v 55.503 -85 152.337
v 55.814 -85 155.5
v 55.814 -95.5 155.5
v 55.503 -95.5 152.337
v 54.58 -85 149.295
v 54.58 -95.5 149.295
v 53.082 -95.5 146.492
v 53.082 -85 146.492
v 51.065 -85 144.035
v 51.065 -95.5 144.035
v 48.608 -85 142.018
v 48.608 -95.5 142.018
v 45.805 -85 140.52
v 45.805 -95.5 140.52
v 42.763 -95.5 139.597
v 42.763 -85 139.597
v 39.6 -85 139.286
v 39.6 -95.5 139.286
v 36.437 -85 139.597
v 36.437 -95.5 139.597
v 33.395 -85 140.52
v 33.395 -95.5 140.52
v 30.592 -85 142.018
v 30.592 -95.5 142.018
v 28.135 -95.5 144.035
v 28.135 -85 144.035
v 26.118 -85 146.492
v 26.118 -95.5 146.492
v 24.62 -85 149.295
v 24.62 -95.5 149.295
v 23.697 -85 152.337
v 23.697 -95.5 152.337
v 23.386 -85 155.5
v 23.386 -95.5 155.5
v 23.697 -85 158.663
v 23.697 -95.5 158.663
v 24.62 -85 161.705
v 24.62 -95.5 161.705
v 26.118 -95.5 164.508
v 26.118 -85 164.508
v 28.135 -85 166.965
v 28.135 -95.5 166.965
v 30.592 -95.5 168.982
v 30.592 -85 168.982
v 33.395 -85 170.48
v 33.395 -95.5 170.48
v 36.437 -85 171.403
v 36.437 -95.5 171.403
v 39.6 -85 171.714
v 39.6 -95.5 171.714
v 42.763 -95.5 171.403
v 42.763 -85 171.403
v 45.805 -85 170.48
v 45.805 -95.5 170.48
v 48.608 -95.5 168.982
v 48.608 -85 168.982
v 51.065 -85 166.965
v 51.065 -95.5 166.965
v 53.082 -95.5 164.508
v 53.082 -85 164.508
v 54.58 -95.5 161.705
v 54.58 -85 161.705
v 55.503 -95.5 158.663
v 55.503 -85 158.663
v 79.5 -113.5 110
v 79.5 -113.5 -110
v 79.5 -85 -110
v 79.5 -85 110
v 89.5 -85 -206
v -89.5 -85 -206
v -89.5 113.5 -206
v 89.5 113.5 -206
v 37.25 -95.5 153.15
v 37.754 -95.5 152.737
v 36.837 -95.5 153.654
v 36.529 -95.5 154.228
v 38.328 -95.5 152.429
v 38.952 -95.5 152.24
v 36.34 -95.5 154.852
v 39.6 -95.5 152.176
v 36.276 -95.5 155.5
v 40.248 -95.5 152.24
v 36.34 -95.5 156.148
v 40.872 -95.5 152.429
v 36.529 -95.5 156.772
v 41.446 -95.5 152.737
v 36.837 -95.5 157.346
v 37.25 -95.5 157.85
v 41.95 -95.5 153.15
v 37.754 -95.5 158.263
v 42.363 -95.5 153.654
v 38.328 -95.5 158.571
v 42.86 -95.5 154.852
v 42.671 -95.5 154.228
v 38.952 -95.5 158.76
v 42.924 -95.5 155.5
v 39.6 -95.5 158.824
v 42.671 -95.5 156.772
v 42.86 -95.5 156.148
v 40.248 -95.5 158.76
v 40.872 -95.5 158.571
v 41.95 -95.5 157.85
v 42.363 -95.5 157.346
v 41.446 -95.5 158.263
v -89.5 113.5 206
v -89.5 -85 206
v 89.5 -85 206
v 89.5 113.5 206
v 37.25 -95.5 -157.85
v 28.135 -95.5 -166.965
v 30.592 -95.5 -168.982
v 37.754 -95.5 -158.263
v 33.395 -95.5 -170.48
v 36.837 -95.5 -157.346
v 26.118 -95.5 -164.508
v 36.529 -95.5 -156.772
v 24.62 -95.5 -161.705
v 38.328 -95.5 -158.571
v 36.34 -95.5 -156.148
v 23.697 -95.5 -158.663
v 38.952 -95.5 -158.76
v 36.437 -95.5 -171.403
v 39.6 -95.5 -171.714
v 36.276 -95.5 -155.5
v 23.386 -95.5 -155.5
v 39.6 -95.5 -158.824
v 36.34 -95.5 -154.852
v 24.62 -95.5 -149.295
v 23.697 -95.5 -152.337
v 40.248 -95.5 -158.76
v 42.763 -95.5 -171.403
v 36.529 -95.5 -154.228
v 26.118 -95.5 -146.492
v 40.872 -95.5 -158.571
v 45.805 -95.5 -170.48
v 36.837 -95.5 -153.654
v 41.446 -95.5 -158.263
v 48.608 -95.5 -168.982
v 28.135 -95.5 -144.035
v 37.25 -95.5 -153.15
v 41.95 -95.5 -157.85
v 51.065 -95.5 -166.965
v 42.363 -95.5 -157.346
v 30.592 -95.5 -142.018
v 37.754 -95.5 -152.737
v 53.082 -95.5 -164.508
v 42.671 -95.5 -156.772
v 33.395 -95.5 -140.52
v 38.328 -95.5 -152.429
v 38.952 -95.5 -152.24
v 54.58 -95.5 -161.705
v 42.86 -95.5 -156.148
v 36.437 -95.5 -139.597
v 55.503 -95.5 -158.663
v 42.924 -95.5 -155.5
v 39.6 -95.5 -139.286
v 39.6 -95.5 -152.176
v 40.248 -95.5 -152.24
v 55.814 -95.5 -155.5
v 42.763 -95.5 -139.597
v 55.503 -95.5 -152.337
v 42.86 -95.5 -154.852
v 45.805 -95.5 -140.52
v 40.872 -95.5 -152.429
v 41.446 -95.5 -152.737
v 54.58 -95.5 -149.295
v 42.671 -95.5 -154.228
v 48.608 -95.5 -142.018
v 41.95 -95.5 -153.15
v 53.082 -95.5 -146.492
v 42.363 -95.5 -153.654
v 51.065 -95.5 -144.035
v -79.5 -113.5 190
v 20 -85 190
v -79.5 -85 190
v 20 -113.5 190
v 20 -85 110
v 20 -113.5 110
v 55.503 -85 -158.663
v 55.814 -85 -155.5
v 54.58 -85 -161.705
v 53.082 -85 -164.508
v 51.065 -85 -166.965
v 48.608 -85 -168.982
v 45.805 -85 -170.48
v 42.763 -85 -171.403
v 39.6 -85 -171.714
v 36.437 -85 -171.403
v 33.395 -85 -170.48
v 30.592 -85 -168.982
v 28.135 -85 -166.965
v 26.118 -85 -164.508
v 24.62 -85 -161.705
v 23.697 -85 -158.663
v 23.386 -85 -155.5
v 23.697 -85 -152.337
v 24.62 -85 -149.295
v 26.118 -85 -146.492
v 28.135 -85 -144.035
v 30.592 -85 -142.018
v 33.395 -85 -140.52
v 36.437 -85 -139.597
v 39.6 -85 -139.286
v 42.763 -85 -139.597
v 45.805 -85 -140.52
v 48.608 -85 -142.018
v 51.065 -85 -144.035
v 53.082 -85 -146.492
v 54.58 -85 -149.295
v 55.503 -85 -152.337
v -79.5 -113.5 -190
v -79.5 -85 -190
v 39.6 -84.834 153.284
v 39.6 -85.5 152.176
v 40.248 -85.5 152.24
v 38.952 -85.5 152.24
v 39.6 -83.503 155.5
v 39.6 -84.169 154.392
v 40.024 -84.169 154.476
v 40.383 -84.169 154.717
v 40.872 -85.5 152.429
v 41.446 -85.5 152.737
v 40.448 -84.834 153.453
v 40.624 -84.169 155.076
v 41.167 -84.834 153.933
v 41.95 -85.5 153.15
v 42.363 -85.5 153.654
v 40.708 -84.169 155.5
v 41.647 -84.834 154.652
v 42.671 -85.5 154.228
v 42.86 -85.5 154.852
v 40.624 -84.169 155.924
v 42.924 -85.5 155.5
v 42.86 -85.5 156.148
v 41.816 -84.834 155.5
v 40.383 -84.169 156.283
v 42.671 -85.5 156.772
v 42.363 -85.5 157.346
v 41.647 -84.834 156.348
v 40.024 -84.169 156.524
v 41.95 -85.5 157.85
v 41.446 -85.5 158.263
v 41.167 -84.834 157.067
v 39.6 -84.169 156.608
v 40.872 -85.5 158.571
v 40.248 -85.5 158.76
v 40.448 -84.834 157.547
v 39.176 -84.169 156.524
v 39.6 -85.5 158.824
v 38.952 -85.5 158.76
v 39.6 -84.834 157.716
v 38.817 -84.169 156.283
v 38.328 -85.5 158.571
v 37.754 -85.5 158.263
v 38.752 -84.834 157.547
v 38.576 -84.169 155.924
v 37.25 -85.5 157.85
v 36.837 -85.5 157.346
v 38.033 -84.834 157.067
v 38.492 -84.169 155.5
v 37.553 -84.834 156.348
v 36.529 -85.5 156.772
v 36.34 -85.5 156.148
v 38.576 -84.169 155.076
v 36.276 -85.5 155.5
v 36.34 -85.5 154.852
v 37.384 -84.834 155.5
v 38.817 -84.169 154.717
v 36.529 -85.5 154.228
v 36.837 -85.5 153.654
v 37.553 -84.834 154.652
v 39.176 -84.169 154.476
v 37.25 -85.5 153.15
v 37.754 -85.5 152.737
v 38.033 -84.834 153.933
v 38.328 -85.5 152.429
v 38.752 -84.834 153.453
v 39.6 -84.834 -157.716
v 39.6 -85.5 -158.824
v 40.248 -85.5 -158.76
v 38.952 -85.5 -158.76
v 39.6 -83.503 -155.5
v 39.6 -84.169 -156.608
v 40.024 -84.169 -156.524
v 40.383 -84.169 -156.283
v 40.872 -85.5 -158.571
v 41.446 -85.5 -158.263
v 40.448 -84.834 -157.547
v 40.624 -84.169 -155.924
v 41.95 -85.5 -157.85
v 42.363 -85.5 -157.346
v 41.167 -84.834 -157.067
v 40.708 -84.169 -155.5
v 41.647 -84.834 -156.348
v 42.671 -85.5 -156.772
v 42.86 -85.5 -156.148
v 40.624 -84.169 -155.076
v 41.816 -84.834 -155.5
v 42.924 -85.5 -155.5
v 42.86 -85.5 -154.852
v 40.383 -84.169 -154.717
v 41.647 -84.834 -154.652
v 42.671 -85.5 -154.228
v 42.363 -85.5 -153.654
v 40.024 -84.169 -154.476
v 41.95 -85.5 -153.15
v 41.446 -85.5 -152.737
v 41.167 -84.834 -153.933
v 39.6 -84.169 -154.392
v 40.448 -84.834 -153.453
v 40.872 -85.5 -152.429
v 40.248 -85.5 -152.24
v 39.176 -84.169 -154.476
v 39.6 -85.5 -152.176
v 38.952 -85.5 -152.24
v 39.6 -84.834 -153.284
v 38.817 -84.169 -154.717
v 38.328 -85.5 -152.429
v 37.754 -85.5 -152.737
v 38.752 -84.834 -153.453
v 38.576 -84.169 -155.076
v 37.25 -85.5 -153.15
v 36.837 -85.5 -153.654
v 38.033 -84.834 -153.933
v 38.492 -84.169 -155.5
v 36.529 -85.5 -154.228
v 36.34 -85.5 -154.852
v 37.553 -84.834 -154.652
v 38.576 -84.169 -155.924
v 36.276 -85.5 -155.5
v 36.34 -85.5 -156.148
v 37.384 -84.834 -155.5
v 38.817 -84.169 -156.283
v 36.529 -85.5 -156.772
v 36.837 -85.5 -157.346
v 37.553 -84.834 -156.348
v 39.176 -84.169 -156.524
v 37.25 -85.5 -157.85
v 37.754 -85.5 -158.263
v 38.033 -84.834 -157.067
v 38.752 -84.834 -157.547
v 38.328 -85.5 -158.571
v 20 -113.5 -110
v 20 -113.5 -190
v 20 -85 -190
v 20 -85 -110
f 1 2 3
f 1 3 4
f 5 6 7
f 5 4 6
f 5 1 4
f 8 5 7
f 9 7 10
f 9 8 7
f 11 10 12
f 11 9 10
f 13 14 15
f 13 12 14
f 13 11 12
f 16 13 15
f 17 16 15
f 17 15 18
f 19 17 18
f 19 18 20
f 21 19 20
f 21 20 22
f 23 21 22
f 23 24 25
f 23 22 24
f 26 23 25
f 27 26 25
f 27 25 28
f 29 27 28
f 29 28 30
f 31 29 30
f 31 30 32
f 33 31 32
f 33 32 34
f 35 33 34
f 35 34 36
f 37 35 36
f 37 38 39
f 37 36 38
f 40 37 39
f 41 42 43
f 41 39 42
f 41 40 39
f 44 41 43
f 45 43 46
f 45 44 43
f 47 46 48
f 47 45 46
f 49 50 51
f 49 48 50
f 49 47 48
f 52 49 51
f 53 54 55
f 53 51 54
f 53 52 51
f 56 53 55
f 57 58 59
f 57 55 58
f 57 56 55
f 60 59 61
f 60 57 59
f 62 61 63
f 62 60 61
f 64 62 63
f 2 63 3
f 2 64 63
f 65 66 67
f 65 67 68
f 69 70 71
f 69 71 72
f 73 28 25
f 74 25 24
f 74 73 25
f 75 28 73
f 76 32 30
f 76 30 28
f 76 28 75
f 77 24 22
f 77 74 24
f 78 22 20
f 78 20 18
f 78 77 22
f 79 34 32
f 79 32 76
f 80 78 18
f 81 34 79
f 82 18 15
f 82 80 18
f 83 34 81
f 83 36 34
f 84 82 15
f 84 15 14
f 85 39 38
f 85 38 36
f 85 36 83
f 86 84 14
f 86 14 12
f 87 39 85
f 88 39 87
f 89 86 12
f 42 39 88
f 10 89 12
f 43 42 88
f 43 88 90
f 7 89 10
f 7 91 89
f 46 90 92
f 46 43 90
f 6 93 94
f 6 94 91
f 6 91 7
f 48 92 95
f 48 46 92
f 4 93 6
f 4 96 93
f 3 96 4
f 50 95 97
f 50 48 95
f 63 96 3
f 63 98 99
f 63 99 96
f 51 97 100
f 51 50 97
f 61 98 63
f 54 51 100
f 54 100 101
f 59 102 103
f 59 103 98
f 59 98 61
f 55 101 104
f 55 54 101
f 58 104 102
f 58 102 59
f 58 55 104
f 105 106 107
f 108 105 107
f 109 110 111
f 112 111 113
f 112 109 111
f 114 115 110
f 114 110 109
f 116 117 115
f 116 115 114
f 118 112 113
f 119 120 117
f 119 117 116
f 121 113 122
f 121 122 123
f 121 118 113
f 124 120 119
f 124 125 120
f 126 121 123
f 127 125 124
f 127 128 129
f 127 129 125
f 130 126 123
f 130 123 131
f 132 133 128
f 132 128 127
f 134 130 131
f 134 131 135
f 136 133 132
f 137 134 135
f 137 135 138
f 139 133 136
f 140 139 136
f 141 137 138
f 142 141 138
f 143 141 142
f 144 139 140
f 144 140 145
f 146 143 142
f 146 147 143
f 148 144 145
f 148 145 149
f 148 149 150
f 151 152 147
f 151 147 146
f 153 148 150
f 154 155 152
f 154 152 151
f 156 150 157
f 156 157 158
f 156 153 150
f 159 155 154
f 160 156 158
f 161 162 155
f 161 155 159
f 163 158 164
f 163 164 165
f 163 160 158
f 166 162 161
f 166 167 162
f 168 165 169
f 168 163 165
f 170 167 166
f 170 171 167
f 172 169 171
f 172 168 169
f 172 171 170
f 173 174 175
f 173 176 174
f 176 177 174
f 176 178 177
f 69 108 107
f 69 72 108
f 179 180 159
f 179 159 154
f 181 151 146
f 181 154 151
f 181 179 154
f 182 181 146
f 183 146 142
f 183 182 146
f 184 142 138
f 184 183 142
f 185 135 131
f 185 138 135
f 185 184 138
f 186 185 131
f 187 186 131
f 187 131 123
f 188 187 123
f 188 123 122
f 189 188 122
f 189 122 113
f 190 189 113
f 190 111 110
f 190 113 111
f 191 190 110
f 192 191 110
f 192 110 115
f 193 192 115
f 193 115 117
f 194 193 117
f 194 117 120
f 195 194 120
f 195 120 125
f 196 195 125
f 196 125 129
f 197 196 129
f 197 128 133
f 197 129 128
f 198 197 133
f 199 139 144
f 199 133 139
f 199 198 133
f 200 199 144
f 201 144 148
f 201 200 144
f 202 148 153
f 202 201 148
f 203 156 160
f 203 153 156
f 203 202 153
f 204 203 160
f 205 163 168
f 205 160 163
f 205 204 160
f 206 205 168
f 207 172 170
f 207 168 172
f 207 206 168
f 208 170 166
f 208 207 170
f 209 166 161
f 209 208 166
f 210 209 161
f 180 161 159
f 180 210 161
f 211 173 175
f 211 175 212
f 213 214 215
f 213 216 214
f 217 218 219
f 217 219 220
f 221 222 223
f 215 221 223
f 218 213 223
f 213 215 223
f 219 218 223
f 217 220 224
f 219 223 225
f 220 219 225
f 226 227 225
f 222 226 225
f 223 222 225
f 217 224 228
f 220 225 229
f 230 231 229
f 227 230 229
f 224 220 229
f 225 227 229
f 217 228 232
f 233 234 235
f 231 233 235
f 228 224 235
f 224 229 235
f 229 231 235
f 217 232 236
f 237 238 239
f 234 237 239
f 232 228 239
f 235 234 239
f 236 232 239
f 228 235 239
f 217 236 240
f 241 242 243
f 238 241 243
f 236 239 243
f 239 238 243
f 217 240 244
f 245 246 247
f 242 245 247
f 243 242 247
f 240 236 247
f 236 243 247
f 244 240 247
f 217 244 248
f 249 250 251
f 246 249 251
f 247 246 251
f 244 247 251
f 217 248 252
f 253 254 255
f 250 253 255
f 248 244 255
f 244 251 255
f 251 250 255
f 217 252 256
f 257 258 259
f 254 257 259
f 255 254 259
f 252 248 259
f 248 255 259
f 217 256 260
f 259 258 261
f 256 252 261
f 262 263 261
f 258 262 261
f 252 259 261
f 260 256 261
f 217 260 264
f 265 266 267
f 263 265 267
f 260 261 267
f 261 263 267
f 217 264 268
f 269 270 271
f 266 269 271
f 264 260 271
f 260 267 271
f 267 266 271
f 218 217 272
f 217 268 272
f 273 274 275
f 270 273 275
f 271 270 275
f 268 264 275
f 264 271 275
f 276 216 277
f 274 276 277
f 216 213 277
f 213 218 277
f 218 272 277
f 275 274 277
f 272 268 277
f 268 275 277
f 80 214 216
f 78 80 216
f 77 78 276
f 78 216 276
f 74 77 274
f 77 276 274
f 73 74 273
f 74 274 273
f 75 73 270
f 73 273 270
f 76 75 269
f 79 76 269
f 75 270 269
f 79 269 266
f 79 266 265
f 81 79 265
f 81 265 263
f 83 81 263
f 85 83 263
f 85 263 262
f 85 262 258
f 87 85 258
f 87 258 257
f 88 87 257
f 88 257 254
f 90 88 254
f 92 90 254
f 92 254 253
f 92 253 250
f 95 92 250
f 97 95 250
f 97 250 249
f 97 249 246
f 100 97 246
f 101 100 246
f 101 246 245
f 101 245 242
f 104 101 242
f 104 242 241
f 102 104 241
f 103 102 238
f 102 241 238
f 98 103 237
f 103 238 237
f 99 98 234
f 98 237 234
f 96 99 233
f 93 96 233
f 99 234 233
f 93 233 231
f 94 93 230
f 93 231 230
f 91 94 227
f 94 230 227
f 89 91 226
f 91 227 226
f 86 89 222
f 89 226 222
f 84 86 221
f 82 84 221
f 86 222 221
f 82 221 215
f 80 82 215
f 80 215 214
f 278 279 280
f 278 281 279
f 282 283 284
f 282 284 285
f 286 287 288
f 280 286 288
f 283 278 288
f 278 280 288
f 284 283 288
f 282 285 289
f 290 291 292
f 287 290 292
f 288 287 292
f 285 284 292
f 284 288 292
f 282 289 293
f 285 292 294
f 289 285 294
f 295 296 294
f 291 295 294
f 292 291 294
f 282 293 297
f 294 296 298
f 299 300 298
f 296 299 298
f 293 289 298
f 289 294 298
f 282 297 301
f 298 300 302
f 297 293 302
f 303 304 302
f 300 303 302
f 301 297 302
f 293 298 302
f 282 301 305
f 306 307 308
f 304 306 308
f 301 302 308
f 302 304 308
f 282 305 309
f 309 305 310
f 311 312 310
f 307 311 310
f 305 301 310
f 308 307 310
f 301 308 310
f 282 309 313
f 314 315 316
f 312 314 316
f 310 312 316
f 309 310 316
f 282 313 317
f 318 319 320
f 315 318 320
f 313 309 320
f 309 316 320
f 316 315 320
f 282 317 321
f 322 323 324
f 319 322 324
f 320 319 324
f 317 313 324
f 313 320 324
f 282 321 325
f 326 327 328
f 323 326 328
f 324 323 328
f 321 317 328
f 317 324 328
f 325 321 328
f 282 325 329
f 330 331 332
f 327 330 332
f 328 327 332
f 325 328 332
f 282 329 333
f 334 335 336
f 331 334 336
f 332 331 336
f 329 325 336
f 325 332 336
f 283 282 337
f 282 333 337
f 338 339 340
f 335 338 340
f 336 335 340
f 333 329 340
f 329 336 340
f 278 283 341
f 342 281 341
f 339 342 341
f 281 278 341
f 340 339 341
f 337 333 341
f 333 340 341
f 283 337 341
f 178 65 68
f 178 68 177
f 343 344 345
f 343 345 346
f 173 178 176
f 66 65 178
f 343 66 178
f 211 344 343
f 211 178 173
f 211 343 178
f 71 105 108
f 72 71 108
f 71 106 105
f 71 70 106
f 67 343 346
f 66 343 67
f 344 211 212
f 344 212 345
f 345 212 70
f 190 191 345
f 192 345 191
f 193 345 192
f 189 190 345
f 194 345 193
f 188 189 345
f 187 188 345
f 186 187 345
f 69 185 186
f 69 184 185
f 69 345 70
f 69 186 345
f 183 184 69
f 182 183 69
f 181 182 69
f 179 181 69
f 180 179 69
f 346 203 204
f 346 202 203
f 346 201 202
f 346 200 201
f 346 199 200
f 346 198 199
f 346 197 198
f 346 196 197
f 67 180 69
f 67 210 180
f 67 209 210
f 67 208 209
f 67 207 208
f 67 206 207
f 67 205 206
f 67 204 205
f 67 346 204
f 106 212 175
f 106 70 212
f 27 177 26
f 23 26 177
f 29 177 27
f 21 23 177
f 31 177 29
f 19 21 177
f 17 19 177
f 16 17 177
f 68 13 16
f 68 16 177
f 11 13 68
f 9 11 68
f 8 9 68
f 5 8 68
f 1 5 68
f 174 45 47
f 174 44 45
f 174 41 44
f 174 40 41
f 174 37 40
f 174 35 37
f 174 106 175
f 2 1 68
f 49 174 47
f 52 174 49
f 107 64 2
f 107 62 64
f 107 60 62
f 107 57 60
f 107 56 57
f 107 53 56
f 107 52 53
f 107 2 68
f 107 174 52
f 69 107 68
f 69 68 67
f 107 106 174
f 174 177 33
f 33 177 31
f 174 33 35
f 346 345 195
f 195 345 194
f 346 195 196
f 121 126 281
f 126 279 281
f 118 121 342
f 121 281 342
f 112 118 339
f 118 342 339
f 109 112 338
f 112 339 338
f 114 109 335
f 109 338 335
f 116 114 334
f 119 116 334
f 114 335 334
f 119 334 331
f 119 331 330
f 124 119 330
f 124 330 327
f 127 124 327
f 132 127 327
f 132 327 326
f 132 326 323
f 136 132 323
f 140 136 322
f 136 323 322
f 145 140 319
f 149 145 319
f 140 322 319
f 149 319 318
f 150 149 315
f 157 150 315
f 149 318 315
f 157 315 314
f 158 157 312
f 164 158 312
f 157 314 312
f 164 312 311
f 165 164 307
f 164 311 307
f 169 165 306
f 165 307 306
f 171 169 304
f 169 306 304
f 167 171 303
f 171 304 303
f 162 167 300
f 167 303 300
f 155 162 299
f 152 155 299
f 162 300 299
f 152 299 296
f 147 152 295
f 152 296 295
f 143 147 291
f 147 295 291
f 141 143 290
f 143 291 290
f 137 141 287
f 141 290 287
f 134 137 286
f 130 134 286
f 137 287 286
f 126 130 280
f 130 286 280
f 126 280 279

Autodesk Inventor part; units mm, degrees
ref_plane "YZ Plane" through (0, 0, 0) normal (1, 0, 0) x (0, 1, 0)
ref_plane "XZ Plane" through (0, 0, 0) normal (0, 1, 0) x (-1, 0, 0)
ref_plane "XY Plane" through (0, 0, 0) normal (0, 0, 1) x (1, 0, 0)
sketch "Sketch1" plane through (0, 0, 0) normal (0, 0, 1) x (1, 0, 0)
  line L0 (0, 158.9) -> (0, -158.9) construction
  line L1 (-125.3, 0) -> (125.3, 0) construction
  line L2 (89.5, -113.5) -> (-89.5, -113.5)
  line L3 (-89.5, -113.5) -> (-89.5, 113.5)
  line L4 (-89.5, 113.5) -> (89.5, 113.5)
  line L5 (89.5, 113.5) -> (89.5, -113.5)
  line L6 (89.5, -113.5) -> (-89.5, 113.5) construction
  line L7 (-89.5, -113.5) -> (89.5, 113.5) construction
  point P0 (0, 0)
  dimension "d4" = 227
  dimension "d5" = 179
extrude "Extrusion3" add sketch "Sketch1" along normal mid plane 412
sketch "Sketch2" plane through (-89.5, -113.5, 206) normal (0, -1, 0) x (1, 0, 0)
  line L0 (179, -412) -> (179, 0) projected
  line L1 (0, 0) -> (179, 0) projected
  line L2 (0, 0) -> (0, -412) projected
  line L3 (179, -412) -> (0, -412) projected
  line L4 (109.5, -16) -> (10, -16)
  line L5 (10, -16) -> (10, -396)
  line L6 (10, -396) -> (109.5, -396)
  line L7 (109.5, -396) -> (109.5, -16)
  line L8 (109.5, -16) -> (10, -396) construction
  line L9 (10, -16) -> (109.5, -396) construction
  line L10 (169, -96) -> (109.5, -96)
  line L11 (109.5, -96) -> (109.5, -316)
  line L12 (109.5, -316) -> (169, -316)
  line L13 (169, -316) -> (169, -96)
  line L14 (169, -96) -> (109.5, -316) construction
  line L15 (109.5, -96) -> (169, -316) construction
  point P0 (89.5, -206)
  point P1 (59.75, -206)
  point P2 (139.25, -206)
  point P3 (59.75, -206)
  point P4 (139.25, -206)
  dimension "d8" = 220
  dimension "d9" = 380
  dimension "d10" = 10
  dimension "d11" = 10
  dimension "d12" = 20
extrude "Extrusion4" cut sketch "Sketch2" against normal blind 28.5
sketch "Sketch3" plane through (-89.5, -85, 206) normal (0, -1, 0) x (1, 0, 0)
  circle A0 centre (129.1, -361.5) radius 16.2143
  circle A1 centre (129.1, -50.5) radius 16.2143
  line L0 (179, -412) -> (0, -412) projected
  line L1 (0, 0) -> (179, 0) projected
  line L2 (89.5, 82.4) -> (89.5, -494.4) projected
  point P0 (89.5, -206)
  dimension "d17" = 311
  dimension "d18" = 50.5
  dimension "d20" = 50.5
  dimension "d21" = 39.6
extrude "Extrusion5" add sketch "Sketch3" along normal blind 10.5
sketch "Sketch4" plane through (39.6, -95.5, -155.5) normal (0, -1, 0) x (1, 0, 0)
  circle A0 centre (0, 0) radius 16.2143 projected
  circle A1 centre (0, 311) radius 16.2143 projected
  line L0 (49.9, 361.5) -> (49.9, -50.5) projected
  line L1 (-129.1, 361.5) -> (49.9, 361.5) projected
  line L2 (-129.1, -50.5) -> (-129.1, 361.5) projected
  line L3 (49.9, -50.5) -> (-129.1, -50.5) projected
  line L4 (-19.6, 265.5) -> (-19.6, 345.5) projected
  line L5 (39.9, 265.5) -> (-19.6, 265.5) projected
  line L6 (39.9, 45.5) -> (39.9, 265.5) projected
  line L7 (-19.6, 45.5) -> (39.9, 45.5) projected
  line L8 (-19.6, -34.5) -> (-19.6, 45.5) projected
  line L9 (-119.1, -34.5) -> (-19.6, -34.5) projected
  line L10 (-119.1, 345.5) -> (-119.1, -34.5) projected
  line L11 (-19.6, 345.5) -> (-119.1, 345.5) projected
  point P0 (-39.6, 155.5)
hole "Hole1" at (39.6, -95.5, -155.5) at (39.6, -95.5, 155.5) direction (0, 1, 0) diameter 6.647 depth 10 tip angle 118 thread size "M8x1.25" class "6H" standard "ISO Metric profile"
equation "\"d18\" = d20"
properties part number "17-0028-0034" material "ABS Plastic"
